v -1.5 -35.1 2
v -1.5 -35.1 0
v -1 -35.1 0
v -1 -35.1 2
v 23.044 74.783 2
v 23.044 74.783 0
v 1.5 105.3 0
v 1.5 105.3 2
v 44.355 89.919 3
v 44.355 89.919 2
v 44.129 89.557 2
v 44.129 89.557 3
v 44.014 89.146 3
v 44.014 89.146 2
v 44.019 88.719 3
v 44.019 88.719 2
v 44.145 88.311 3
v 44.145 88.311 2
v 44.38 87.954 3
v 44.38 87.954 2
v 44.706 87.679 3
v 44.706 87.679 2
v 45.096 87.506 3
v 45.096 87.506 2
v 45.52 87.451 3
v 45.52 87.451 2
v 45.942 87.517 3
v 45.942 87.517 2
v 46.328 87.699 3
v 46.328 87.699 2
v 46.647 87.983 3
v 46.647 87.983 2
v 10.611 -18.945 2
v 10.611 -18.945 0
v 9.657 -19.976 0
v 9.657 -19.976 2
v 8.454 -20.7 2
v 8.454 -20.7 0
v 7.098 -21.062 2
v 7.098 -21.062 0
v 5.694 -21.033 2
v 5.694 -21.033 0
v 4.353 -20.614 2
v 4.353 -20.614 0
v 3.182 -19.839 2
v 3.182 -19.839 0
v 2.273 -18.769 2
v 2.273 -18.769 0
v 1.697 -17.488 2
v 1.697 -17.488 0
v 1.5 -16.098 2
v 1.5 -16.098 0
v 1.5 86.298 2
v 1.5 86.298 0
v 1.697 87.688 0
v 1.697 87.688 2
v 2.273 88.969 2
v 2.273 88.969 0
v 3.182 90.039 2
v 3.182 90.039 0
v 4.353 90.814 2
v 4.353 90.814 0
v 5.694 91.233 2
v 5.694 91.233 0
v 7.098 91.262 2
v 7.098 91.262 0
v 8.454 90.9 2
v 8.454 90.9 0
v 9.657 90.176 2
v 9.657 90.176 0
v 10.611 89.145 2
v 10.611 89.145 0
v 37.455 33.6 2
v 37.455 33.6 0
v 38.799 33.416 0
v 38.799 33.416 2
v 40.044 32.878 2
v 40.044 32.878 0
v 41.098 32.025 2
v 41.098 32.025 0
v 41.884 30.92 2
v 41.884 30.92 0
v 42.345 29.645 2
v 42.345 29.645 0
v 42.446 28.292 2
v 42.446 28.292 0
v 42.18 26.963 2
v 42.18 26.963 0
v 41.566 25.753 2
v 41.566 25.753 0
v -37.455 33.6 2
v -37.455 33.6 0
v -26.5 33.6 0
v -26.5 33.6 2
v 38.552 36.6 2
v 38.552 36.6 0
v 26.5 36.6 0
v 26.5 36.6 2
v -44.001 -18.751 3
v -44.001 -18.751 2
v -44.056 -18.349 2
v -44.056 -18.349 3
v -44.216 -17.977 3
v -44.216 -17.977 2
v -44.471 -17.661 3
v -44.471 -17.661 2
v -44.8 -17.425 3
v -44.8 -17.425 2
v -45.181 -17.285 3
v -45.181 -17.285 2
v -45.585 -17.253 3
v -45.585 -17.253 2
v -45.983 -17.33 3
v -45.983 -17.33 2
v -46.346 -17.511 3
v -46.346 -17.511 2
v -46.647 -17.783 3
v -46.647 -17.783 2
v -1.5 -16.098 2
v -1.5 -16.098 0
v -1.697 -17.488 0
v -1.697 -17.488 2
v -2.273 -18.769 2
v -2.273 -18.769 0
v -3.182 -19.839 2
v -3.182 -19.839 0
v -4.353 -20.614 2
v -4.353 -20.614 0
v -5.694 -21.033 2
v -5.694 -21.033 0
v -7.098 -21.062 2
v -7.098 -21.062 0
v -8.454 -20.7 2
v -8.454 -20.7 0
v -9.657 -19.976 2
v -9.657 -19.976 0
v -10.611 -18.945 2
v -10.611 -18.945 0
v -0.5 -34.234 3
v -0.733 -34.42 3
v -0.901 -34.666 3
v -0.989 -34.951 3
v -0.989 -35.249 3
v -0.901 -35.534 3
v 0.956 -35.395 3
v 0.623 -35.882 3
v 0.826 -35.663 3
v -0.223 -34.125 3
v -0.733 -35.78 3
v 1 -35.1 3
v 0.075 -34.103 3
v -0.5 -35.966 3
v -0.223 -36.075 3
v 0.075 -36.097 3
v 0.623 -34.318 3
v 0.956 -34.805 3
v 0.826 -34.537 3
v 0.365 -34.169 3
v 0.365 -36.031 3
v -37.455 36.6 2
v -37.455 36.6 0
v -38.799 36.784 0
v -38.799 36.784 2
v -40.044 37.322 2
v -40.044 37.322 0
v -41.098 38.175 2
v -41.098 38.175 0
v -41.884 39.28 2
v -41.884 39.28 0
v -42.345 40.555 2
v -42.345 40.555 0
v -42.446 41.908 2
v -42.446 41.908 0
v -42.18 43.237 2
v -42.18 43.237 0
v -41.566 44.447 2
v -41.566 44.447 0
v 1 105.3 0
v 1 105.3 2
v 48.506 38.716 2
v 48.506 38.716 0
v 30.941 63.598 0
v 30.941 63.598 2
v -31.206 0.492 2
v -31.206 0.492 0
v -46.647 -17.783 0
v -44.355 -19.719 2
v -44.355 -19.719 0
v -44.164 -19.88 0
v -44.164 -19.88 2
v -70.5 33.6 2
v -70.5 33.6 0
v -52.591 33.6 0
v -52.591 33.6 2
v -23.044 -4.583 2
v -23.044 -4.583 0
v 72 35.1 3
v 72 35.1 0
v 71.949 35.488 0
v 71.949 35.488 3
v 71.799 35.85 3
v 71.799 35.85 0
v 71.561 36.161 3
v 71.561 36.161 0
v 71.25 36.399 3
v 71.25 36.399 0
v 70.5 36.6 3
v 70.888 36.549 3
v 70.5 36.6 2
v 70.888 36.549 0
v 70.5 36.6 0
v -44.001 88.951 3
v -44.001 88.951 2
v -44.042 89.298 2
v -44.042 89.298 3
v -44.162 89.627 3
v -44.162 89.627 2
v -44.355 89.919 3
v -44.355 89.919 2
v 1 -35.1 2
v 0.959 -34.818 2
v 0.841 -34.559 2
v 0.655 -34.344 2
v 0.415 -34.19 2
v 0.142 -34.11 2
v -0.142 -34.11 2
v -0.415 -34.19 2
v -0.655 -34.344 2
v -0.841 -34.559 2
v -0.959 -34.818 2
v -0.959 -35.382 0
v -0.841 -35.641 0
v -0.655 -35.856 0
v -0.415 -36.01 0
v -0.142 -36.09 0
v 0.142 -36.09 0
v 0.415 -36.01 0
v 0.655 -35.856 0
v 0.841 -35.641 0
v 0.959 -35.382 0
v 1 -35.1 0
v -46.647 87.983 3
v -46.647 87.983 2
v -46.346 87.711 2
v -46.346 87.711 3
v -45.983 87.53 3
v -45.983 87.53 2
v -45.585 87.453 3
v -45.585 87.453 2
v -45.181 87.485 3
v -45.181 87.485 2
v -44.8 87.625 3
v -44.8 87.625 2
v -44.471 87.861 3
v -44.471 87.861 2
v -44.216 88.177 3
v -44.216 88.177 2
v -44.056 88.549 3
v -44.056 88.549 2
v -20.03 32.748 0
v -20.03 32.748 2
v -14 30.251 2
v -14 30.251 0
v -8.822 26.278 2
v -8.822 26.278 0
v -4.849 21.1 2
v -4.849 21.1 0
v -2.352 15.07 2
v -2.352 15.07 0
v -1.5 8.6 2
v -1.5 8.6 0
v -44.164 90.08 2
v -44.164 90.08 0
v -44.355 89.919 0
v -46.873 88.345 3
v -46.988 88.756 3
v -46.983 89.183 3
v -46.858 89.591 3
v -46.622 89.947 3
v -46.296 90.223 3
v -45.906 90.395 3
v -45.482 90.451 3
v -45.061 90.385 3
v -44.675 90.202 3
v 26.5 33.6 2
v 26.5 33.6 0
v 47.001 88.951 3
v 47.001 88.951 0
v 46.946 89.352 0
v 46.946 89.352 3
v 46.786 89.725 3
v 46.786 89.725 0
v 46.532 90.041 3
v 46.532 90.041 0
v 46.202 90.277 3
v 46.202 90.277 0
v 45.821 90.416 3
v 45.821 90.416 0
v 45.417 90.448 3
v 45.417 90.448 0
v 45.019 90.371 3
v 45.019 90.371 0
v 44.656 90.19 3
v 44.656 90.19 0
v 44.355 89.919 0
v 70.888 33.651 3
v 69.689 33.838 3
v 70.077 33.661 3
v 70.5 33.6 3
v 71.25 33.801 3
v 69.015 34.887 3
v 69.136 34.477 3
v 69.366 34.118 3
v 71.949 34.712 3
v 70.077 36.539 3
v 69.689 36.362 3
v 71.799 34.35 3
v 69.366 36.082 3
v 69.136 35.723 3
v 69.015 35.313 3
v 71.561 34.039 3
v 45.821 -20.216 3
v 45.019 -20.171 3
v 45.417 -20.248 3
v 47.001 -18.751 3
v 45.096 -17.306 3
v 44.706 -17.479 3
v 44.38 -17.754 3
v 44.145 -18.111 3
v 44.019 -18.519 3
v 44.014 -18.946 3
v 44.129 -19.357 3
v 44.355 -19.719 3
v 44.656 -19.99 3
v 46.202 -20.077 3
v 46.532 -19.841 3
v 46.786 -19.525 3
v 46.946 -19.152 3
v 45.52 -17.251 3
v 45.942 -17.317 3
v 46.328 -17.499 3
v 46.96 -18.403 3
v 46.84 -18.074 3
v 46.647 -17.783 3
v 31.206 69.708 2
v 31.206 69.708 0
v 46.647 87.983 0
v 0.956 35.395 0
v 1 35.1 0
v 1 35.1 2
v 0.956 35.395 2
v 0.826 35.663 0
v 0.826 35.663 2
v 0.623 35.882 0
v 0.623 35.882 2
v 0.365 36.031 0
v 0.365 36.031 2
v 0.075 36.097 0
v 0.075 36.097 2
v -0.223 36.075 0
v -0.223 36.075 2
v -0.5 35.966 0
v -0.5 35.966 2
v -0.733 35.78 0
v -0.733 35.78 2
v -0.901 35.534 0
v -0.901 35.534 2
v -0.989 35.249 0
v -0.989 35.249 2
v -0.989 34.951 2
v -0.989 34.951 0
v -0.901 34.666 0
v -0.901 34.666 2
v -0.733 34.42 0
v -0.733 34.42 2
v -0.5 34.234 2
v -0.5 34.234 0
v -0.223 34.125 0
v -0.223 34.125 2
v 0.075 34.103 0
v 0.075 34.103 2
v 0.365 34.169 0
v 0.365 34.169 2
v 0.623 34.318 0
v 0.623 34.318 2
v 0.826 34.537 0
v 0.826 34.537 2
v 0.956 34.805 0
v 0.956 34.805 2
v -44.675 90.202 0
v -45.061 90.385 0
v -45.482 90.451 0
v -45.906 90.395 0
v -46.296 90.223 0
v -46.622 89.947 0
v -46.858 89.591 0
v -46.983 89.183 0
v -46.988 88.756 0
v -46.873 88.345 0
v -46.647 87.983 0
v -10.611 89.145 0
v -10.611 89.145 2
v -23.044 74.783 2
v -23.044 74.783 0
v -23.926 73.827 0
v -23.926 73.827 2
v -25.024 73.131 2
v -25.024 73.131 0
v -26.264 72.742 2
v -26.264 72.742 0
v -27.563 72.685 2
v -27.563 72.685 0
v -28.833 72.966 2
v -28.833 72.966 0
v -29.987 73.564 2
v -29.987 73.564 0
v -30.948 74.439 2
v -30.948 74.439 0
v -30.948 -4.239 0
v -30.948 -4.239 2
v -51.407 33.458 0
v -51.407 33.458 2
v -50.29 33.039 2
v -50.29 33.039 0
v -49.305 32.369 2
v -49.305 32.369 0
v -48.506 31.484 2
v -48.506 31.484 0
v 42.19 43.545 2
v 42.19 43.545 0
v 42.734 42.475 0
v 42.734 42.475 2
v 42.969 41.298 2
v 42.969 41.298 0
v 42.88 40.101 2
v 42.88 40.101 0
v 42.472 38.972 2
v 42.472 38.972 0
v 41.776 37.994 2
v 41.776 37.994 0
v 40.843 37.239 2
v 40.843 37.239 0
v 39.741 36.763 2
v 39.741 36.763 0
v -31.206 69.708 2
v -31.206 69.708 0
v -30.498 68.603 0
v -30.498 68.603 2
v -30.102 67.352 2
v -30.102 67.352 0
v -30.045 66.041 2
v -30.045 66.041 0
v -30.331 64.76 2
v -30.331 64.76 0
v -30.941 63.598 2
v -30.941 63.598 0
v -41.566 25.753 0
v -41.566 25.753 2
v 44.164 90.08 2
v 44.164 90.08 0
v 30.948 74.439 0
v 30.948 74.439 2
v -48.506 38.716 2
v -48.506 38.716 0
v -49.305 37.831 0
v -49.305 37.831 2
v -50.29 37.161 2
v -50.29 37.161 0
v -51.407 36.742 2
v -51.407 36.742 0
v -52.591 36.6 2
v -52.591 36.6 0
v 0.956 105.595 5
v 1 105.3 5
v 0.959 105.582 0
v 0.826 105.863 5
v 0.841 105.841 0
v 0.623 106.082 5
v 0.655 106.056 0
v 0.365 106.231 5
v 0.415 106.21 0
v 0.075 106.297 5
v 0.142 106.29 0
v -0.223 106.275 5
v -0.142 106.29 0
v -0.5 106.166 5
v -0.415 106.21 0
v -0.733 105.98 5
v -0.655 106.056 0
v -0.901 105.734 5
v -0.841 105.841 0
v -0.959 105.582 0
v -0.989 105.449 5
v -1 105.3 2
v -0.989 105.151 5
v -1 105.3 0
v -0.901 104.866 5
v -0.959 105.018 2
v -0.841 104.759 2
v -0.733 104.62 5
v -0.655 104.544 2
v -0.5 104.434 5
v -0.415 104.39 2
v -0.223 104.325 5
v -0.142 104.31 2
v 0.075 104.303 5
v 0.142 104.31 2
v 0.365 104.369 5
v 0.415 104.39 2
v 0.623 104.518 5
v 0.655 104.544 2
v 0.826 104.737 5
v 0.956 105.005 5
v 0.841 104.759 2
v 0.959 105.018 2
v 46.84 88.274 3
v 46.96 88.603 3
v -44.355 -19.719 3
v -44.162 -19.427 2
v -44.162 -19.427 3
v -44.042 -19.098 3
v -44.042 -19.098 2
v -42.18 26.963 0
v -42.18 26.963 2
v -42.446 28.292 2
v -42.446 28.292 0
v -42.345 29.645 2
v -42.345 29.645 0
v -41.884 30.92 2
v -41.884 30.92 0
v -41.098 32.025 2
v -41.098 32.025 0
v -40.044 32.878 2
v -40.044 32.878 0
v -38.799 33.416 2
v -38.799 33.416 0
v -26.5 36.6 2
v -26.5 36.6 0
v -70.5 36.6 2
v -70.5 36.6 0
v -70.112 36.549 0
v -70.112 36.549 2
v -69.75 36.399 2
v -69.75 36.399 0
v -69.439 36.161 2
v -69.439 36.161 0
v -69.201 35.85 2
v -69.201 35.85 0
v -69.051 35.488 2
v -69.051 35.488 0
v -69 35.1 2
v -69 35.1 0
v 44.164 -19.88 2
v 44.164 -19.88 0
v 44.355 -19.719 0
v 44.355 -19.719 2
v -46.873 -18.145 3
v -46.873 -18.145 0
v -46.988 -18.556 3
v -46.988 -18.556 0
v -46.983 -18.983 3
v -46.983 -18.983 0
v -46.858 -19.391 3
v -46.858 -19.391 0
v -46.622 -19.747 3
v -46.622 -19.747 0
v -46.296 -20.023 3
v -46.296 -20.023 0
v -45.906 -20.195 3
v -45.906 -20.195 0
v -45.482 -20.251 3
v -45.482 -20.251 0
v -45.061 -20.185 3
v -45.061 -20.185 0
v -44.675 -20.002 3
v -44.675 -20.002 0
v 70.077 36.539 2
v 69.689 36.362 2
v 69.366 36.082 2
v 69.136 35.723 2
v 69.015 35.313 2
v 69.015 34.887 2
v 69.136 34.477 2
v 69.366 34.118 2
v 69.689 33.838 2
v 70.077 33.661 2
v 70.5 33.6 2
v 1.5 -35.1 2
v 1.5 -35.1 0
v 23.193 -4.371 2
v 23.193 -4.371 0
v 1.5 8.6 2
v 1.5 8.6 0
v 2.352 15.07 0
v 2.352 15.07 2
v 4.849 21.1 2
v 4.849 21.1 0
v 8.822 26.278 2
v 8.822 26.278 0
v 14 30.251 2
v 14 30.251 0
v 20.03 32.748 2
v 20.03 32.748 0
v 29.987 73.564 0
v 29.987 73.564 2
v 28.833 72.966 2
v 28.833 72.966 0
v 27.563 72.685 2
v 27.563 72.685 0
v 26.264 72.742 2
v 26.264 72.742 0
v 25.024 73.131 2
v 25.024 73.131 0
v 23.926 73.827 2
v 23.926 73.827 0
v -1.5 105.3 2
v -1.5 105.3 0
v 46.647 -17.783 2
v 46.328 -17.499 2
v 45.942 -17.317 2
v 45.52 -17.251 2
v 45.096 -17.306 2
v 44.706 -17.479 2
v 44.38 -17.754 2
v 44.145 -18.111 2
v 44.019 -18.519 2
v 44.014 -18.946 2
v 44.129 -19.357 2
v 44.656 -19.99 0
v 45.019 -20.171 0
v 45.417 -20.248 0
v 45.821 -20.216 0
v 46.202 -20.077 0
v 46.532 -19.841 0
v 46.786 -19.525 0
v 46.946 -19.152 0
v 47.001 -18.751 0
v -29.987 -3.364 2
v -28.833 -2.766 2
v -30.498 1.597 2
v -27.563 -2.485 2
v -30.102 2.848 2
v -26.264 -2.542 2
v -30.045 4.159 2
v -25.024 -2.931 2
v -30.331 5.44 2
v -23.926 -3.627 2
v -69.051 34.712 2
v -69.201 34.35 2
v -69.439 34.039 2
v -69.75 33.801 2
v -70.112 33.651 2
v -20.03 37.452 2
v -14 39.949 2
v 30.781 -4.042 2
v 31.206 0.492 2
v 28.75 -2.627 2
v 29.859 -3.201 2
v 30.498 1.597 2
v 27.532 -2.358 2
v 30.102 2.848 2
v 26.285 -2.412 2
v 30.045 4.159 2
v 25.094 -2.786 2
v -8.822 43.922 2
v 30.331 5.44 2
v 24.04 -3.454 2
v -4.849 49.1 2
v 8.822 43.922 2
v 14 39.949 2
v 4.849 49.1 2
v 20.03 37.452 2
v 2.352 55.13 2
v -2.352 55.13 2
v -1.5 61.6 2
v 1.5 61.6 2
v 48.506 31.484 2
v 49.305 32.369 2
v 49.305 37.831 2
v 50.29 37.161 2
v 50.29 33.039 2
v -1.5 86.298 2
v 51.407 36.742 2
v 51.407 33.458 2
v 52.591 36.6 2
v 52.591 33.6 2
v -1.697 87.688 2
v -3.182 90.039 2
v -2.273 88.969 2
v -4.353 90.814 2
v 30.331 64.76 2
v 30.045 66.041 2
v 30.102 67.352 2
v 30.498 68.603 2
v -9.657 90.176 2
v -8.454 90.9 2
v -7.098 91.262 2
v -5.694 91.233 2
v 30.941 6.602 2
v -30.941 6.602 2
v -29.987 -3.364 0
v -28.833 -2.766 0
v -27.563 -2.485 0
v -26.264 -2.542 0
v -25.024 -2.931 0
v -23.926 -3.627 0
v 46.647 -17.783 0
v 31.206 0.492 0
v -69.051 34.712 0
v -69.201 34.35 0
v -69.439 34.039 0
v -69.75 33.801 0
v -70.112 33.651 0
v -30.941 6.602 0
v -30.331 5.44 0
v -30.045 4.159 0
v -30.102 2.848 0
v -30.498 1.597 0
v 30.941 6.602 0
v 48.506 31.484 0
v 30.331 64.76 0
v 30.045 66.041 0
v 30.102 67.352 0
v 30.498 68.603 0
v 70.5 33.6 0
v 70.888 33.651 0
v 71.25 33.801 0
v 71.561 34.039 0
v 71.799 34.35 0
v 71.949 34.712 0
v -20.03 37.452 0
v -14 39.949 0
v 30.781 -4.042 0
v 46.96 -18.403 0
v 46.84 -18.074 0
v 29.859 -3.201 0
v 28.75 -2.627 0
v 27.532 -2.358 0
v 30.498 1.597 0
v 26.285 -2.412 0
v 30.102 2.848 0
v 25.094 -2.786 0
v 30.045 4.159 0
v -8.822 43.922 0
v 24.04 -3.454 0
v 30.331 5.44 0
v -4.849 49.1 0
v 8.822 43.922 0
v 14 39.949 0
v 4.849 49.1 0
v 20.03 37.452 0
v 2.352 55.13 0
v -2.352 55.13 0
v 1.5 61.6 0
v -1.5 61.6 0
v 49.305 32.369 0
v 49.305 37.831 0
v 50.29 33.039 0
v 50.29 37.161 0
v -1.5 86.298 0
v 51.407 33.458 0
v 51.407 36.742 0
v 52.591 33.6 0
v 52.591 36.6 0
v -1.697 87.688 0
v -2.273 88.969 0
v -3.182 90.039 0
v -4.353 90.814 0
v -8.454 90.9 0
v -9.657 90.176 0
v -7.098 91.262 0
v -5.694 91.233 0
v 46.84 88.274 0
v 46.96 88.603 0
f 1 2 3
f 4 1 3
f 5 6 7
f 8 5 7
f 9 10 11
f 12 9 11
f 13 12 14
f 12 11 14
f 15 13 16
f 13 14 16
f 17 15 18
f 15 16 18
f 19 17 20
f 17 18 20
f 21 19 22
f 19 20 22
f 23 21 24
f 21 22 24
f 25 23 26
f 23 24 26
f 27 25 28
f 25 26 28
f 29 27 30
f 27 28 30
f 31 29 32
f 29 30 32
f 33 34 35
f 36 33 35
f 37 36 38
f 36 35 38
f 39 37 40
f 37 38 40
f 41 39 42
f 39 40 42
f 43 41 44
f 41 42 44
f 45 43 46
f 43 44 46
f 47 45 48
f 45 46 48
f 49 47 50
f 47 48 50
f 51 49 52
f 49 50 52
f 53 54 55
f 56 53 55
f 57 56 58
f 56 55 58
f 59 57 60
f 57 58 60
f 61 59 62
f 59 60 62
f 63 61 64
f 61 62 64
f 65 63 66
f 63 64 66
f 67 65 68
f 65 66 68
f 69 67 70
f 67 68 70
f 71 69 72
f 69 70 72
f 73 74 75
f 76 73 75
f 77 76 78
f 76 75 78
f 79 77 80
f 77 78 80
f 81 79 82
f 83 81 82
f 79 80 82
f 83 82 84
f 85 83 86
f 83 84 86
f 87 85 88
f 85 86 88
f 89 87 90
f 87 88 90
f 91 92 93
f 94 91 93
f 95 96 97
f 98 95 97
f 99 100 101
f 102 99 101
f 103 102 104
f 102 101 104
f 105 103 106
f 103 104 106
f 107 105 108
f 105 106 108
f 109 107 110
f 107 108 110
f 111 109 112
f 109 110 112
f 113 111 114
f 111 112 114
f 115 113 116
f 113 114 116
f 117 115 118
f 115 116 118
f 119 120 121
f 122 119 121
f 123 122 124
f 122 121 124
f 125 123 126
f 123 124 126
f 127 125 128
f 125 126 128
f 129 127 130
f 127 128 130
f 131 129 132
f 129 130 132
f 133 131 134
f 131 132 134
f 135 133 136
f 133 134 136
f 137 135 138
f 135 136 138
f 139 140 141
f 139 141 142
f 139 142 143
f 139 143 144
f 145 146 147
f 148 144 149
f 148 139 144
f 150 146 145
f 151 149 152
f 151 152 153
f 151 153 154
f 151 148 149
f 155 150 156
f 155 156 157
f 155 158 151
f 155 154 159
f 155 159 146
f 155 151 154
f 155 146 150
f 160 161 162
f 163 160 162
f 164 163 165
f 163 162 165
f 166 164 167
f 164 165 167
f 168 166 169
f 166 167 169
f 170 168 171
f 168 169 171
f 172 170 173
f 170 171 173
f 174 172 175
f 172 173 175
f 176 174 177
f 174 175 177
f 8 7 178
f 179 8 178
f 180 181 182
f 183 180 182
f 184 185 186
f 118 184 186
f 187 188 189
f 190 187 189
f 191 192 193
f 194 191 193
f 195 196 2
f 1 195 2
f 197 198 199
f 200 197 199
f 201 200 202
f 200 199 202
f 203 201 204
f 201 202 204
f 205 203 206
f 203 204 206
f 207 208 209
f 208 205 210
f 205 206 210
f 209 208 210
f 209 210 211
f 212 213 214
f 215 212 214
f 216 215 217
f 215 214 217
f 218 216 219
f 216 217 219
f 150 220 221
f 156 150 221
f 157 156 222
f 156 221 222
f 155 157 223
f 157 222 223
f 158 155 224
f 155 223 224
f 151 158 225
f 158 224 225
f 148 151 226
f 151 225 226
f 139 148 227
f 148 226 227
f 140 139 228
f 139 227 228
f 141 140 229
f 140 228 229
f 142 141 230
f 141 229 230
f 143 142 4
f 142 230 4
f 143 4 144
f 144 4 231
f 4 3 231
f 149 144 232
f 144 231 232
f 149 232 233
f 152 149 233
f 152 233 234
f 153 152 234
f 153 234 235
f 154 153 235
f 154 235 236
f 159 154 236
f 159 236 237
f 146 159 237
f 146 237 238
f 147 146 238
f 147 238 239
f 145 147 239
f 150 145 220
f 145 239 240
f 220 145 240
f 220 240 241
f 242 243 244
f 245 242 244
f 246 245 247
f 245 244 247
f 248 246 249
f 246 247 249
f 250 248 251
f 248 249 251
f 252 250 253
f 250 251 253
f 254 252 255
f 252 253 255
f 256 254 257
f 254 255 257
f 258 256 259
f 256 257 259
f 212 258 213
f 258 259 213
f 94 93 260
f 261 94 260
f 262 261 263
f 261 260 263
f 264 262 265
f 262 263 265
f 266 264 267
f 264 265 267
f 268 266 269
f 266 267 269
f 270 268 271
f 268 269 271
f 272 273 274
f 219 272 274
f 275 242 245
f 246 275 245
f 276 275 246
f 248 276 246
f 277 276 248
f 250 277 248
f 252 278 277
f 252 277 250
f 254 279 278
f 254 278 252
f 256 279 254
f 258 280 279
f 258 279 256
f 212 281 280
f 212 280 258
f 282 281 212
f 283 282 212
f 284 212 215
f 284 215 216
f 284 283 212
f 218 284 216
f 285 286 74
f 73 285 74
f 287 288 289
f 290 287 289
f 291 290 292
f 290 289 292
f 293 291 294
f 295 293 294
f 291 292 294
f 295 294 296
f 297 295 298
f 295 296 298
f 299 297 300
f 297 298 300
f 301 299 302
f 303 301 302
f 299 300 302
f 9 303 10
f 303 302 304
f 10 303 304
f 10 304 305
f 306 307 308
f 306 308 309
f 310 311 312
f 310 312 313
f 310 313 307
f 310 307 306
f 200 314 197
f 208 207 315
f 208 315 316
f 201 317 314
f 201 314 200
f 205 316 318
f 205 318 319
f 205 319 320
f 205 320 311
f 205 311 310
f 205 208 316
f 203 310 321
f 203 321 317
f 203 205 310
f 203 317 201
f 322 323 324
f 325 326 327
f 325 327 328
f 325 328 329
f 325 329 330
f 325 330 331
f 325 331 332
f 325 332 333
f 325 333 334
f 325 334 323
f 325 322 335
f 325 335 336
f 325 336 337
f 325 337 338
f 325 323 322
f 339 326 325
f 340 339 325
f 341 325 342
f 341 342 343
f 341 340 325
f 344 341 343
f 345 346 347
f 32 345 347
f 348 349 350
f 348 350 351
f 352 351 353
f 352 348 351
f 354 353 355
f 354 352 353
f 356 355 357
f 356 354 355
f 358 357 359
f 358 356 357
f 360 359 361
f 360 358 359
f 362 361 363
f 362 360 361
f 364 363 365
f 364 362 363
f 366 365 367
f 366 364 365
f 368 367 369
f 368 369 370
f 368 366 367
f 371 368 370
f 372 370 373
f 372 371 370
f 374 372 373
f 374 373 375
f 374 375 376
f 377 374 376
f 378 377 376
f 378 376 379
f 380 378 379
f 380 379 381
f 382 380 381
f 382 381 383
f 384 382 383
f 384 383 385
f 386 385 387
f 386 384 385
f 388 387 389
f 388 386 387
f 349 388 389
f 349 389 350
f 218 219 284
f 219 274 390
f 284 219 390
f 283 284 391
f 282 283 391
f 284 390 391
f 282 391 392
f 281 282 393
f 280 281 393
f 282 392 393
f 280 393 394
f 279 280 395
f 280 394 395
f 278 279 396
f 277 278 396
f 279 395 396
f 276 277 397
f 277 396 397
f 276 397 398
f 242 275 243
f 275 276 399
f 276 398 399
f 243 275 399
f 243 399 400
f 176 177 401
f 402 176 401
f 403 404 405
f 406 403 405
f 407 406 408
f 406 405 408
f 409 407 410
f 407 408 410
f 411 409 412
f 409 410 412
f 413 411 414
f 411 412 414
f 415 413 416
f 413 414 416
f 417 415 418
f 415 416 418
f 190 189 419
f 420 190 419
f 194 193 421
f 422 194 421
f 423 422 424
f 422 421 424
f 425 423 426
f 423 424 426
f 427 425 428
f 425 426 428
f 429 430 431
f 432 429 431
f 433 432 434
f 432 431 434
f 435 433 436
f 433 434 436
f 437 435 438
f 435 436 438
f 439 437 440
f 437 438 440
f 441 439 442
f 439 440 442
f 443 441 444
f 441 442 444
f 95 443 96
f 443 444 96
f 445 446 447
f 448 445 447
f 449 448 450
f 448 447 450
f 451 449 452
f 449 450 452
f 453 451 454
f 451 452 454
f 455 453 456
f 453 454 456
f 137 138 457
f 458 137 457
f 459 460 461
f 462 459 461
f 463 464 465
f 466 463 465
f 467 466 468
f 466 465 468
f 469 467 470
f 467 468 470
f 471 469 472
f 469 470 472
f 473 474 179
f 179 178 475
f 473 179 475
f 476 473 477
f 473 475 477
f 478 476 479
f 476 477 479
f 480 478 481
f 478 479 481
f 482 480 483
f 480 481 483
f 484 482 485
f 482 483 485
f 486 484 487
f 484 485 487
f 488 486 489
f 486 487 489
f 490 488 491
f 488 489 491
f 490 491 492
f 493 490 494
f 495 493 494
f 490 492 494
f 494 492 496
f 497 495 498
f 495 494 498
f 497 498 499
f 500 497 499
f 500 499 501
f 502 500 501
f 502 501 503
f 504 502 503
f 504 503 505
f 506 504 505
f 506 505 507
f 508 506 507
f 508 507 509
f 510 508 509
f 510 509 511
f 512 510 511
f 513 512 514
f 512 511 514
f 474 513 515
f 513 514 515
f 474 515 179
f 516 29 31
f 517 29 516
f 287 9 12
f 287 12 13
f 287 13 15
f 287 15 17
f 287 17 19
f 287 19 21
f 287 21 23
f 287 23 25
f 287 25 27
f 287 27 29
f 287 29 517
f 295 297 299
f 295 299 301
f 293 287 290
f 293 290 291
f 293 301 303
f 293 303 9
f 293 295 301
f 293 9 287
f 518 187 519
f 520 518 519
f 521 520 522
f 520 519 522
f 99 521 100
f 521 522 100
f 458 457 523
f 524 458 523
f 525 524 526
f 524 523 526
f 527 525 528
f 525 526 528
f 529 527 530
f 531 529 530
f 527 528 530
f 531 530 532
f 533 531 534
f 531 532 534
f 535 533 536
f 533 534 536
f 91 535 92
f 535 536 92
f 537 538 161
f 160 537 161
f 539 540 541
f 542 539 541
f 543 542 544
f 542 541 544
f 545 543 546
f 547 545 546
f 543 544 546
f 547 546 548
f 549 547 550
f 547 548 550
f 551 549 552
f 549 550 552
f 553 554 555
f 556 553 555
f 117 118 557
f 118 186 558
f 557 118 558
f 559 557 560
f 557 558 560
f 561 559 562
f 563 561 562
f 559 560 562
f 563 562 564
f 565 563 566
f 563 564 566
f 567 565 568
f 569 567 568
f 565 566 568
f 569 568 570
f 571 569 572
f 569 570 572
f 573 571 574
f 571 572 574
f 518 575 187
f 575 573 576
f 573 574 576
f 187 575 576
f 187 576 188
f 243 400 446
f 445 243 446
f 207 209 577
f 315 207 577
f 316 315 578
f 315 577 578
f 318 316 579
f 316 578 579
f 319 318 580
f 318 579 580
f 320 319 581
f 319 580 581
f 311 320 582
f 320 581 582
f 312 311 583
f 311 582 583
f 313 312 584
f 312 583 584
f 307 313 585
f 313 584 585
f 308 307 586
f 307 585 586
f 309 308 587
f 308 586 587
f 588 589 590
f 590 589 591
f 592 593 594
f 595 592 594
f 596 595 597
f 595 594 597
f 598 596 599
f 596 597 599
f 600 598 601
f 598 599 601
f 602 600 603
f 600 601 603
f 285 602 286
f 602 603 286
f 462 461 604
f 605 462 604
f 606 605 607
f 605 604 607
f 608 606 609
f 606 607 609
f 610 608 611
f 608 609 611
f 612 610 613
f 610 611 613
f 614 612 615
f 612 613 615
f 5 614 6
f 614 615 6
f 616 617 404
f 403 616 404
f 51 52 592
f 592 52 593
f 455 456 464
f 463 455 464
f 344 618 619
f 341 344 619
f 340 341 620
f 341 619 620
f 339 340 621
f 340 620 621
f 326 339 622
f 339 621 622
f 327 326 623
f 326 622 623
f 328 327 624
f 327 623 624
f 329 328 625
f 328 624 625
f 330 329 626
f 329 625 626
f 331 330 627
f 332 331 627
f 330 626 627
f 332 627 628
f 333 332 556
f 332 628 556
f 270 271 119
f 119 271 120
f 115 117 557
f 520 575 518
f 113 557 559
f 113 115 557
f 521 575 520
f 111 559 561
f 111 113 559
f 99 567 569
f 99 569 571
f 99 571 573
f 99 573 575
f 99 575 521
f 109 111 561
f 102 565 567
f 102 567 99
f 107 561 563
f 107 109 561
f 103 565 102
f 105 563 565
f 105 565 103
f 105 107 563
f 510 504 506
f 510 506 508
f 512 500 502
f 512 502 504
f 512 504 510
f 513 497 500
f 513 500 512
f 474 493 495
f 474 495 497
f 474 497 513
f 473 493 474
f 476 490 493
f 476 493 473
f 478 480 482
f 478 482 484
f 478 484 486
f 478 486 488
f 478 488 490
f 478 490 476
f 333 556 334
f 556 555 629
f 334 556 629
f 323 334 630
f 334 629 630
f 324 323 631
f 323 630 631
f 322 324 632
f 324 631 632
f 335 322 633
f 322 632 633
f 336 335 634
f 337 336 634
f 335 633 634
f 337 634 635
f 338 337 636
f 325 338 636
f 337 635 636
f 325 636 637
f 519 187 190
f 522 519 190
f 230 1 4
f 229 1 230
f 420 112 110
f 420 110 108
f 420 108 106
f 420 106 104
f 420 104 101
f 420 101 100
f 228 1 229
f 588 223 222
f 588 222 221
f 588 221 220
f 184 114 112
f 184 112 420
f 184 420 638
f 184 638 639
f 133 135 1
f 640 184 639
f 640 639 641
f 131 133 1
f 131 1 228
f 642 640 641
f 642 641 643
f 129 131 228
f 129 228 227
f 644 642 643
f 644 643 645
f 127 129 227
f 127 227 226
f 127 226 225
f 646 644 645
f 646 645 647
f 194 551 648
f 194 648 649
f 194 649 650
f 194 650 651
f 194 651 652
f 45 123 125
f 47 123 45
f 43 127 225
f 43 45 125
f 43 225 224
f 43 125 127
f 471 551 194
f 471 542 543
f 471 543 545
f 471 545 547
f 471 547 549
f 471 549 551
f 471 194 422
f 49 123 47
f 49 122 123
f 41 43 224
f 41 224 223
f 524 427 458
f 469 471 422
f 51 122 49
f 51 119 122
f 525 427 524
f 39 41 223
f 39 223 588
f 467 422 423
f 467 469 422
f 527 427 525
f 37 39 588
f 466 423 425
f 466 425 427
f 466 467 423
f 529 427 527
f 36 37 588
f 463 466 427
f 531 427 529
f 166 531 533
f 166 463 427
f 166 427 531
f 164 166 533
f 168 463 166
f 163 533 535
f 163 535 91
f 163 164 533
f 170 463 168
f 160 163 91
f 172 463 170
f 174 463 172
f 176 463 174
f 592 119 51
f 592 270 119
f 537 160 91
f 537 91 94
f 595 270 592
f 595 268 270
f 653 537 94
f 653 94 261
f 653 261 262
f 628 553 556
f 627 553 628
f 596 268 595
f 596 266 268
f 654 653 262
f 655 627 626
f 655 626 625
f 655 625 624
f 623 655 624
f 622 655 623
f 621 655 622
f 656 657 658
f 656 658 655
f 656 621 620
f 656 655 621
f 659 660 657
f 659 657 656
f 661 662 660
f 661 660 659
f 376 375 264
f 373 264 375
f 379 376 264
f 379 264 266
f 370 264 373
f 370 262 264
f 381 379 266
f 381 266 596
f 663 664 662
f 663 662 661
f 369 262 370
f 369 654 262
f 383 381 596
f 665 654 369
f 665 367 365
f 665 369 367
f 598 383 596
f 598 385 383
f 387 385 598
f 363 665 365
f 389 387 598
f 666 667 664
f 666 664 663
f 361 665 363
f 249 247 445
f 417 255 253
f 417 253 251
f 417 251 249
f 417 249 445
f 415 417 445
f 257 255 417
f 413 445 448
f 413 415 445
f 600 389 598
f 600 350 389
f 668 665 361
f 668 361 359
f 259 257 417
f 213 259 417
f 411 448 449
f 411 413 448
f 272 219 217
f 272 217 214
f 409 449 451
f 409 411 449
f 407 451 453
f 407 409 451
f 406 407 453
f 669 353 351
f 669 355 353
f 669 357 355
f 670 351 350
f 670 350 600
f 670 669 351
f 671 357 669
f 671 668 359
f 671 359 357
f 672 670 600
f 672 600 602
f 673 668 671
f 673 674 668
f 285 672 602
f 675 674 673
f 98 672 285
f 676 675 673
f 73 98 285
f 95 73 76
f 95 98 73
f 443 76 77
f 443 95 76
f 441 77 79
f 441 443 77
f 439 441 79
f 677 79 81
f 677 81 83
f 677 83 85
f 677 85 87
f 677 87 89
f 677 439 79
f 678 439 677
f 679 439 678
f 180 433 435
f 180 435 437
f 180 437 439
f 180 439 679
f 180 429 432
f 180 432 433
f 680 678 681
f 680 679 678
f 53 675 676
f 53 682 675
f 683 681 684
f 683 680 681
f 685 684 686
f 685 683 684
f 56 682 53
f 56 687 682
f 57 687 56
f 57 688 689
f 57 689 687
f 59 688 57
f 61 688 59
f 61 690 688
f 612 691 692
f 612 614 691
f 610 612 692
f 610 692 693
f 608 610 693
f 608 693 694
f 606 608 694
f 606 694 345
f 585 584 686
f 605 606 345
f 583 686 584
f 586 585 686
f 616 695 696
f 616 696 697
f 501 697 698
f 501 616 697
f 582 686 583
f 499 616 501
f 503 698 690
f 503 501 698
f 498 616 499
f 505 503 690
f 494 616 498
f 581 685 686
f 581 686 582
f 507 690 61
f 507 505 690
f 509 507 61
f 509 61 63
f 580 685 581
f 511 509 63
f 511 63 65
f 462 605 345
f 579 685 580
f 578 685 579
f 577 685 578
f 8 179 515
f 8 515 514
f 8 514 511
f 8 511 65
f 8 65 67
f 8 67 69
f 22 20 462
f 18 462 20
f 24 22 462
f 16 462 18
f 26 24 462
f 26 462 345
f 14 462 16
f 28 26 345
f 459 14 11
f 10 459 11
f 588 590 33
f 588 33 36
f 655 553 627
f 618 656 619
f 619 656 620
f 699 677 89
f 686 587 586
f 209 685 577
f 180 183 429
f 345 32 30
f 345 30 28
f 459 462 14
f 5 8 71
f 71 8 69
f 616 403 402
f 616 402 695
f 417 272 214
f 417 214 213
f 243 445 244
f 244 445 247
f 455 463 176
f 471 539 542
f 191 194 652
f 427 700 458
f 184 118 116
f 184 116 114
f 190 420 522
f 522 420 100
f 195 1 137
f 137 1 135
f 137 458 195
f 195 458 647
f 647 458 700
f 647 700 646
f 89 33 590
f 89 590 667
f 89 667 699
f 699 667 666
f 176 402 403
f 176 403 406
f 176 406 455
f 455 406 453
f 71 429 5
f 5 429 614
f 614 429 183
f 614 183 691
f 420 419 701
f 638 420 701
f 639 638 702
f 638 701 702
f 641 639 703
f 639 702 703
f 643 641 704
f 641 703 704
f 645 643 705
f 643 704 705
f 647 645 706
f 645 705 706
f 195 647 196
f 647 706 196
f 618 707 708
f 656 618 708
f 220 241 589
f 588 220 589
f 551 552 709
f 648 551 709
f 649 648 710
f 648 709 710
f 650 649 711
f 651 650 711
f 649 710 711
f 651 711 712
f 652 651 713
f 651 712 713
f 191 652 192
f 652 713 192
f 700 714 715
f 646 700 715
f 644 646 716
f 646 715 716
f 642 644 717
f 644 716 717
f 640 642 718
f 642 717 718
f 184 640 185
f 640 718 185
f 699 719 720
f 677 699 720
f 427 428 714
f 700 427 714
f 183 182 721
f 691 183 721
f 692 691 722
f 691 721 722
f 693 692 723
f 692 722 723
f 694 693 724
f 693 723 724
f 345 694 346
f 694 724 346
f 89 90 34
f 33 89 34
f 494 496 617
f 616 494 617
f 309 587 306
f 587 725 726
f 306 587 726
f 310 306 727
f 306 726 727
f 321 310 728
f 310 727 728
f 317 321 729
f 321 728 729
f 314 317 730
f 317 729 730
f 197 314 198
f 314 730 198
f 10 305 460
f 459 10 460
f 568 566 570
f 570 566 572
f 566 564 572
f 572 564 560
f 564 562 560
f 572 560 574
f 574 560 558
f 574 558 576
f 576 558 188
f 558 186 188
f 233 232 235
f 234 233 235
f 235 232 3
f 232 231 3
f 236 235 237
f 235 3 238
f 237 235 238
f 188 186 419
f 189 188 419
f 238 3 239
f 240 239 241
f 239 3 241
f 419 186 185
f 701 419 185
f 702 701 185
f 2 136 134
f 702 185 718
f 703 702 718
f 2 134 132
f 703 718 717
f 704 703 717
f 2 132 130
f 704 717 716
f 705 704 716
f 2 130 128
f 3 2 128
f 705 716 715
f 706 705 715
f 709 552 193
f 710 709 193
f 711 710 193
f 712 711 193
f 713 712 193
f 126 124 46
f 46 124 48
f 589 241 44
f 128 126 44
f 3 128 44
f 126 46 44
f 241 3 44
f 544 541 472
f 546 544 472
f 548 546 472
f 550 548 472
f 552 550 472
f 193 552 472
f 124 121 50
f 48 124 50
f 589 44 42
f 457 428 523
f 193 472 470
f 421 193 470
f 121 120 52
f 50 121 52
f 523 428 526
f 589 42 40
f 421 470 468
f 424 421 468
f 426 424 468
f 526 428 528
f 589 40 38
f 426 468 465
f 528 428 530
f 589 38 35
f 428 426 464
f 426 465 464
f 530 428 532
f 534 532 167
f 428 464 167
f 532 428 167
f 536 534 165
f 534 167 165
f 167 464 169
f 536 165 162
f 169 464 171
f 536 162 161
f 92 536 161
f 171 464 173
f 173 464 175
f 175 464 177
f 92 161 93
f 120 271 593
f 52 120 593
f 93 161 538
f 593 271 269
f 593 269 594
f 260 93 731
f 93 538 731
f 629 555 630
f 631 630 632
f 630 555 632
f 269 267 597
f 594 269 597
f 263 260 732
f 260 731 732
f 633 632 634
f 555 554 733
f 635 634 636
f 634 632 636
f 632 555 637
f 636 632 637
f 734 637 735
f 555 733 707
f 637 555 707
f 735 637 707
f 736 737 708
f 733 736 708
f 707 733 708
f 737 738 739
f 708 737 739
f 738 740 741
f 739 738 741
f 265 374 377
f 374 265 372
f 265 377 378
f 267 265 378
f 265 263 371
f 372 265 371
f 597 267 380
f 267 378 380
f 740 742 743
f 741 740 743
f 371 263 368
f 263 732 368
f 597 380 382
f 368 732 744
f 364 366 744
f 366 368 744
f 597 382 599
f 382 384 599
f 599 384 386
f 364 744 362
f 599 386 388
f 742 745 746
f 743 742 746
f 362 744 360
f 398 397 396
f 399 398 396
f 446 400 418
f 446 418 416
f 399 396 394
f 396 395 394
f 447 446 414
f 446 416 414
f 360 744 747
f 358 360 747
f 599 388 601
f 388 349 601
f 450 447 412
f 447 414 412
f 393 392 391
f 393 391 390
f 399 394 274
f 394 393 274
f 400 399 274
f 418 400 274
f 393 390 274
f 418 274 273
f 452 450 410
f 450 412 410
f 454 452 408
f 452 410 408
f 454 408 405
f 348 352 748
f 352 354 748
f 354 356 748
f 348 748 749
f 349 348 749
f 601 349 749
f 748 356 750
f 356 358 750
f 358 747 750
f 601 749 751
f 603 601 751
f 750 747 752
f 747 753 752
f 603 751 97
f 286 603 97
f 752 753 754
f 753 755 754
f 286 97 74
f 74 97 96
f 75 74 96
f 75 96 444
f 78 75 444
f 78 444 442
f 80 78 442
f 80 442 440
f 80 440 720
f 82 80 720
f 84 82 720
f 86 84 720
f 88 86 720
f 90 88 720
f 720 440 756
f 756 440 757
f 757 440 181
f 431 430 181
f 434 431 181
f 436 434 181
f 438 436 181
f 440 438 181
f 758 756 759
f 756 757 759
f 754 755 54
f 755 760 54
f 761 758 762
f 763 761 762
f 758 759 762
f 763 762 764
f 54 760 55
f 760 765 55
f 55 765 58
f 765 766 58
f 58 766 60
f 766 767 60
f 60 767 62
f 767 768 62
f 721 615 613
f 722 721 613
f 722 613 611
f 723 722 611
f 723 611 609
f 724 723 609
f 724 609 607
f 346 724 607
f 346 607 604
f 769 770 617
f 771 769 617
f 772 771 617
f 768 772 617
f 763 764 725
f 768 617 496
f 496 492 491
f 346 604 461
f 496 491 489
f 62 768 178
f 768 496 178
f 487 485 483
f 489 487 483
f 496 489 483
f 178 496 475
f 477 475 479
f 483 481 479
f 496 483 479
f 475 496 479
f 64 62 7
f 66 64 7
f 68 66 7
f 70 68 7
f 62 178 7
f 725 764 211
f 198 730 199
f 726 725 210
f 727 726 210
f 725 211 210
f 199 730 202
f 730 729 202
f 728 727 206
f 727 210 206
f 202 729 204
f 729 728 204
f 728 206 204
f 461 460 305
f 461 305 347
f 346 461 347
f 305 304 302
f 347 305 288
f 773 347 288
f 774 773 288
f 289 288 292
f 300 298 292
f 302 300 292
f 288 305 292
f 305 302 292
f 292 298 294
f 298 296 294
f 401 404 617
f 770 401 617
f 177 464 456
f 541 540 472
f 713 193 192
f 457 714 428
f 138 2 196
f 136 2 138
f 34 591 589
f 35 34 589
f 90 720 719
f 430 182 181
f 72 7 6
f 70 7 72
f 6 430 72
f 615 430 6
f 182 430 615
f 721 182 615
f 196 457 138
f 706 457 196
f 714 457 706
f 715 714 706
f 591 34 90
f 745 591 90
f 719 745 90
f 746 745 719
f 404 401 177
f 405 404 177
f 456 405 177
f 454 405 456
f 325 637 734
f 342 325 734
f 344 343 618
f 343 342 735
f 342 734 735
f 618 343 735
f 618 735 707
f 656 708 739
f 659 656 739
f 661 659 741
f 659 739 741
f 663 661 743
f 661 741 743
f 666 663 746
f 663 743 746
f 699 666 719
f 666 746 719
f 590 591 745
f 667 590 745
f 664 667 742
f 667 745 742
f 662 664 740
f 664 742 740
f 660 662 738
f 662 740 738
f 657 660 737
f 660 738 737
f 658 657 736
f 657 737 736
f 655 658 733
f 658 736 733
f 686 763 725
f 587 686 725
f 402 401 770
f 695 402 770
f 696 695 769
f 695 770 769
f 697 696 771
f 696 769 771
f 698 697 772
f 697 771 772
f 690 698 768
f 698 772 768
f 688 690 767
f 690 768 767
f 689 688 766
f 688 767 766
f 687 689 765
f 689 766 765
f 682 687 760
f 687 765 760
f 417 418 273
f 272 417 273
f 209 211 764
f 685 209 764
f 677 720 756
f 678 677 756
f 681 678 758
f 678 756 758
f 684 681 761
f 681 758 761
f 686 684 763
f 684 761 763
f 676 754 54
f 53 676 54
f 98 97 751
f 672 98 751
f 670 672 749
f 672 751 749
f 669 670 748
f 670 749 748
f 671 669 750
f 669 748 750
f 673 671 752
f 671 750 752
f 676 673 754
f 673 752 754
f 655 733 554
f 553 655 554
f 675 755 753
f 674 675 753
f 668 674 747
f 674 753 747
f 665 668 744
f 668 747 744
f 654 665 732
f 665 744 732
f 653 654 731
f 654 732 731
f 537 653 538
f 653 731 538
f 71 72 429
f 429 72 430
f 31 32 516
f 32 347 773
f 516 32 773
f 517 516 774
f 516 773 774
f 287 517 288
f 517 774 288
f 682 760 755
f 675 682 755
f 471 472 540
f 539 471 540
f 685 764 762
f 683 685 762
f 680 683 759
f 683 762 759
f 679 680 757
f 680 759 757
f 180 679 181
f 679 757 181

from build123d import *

# Parameters (mm, degrees)
F0_R     = 1
F1_DEPTH = 2
F2_DEPTH = 3
F3_DEPTH = 5


with BuildPart() as f1:
    # F0 (on Top) → F1 (new body)
    with BuildSketch(Plane.XY):
        with BuildLine():
            Line((1, -35.1), (1.5, -35.1))
            Line((1.5, -35.1), (23.193478, -4.3713))
            ThreePointArc((23.193478, -4.3713), (26.906428, -2.344127), (30.781196, -4.041655))
            Line((30.781196, -4.041655), (44.164128, -19.880392))
            Line((44.164128, -19.880392), (44.35536, -19.718811))
            ThreePointArc((44.35536, -19.718811), (44.533011, -17.604942), (46.64688, -17.782593))
            Line((46.64688, -17.782593), (31.206023, 0.491704))
            ThreePointArc((31.206023, 0.491704), (30.029934, 3.501716), (30.940547, 6.602383))
            Line((30.940547, 6.602383), (48.505924, 31.483649))
            ThreePointArc((48.505924, 31.483649), (50.290408, 33.039496), (52.590599, 33.6))
            Line((52.590599, 33.6), (70.5, 33.6))
            ThreePointArc((70.5, 33.6), (69, 35.1), (70.5, 36.6))
            Line((70.5, 36.6), (52.590599, 36.6))
            ThreePointArc((52.590599, 36.6), (50.290408, 37.160504), (48.505924, 38.716351))
            Line((48.505924, 38.716351), (30.940547, 63.597617))
            ThreePointArc((30.940547, 63.597617), (30.029934, 66.698284), (31.206023, 69.708296))
            Line((31.206023, 69.708296), (46.64688, 87.982593))
            ThreePointArc((46.64688, 87.982593), (44.533011, 87.804942), (44.35536, 89.918811))
            Line((44.35536, 89.918811), (44.164128, 90.080392))
            Line((44.164128, 90.080392), (30.948157, 74.439253))
            ThreePointArc((30.948157, 74.439253), (26.91194, 72.670995), (23.044283, 74.782634))
            Line((23.044283, 74.782634), (1.5, 105.3))
            Line((1.5, 105.3), (1, 105.3))
            ThreePointArc((1, 105.3), (0, 104.3), (-1, 105.3))
            Line((-1, 105.3), (-1.5, 105.3))
            Line((-1.5, 105.3), (-23.044283, 74.782634))
            ThreePointArc((-23.044283, 74.782634), (-26.91194, 72.670995), (-30.948157, 74.439253))
            Line((-30.948157, 74.439253), (-44.164128, 90.080392))
            Line((-44.164128, 90.080392), (-44.35536, 89.918811))
            ThreePointArc((-44.35536, 89.918811), (-44.092461, 89.466144), (-44.00112, 88.950702))
            ThreePointArc((-44.00112, 88.950702), (-44.985678, 87.542043), (-46.64688, 87.982593))
            Line((-46.64688, 87.982593), (-31.206023, 69.708296))
            ThreePointArc((-31.206023, 69.708296), (-30.029934, 66.698284), (-30.940547, 63.597617))
            Line((-30.940547, 63.597617), (-48.505924, 38.716351))
            ThreePointArc((-48.505924, 38.716351), (-50.290408, 37.160504), (-52.590599, 36.6))
            Line((-52.590599, 36.6), (-70.5, 36.6))
            ThreePointArc((-70.5, 36.6), (-69.43934, 36.16066), (-69, 35.1))
            ThreePointArc((-69, 35.1), (-69.43934, 34.03934), (-70.5, 33.6))
            Line((-70.5, 33.6), (-52.590599, 33.6))
            ThreePointArc((-52.590599, 33.6), (-50.290408, 33.039496), (-48.505924, 31.483649))
            Line((-48.505924, 31.483649), (-30.940547, 6.602383))
            ThreePointArc((-30.940547, 6.602383), (-30.029934, 3.501716), (-31.206023, 0.491704))
            Line((-31.206023, 0.491704), (-46.64688, -17.782593))
            ThreePointArc((-46.64688, -17.782593), (-44.985678, -17.342043), (-44.00112, -18.750702))
            ThreePointArc((-44.00112, -18.750702), (-44.092461, -19.266144), (-44.35536, -19.718811))
            Line((-44.35536, -19.718811), (-44.164128, -19.880392))
            Line((-44.164128, -19.880392), (-30.948157, -4.239253))
            ThreePointArc((-30.948157, -4.239253), (-26.91194, -2.470995), (-23.044283, -4.582634))
            Line((-23.044283, -4.582634), (-1.5, -35.1))
            Line((-1.5, -35.1), (-1, -35.1))
            ThreePointArc((-1, -35.1), (0, -34.1), (1, -35.1))
        make_face()
        with BuildLine():
            ThreePointArc((-26.5, 33.6), (-8.82233, 26.27767), (-1.5, 8.6))
            Line((-1.5, 8.6), (-1.5, -16.098123))
            ThreePointArc((-1.5, -16.098123), (-5.008784, -20.870573), (-10.61051, -18.944823))
            Line((-10.61051, -18.944823), (-41.565831, 25.753299))
            ThreePointArc((-41.565831, 25.753299), (-41.884401, 30.920183), (-37.455321, 33.6))
            Line((-37.455321, 33.6), (-26.5, 33.6))
        make_face(mode=Mode.SUBTRACT)
        with BuildLine():
            Line((1.5, -16.098123), (1.5, 8.6))
            ThreePointArc((1.5, 8.6), (8.82233, 26.27767), (26.5, 33.6))
            Line((26.5, 33.6), (37.455321, 33.6))
            ThreePointArc((37.455321, 33.6), (41.884401, 30.920183), (41.565831, 25.753299))
            Line((41.565831, 25.753299), (10.61051, -18.944823))
            ThreePointArc((10.61051, -18.944823), (5.008784, -20.870573), (1.5, -16.098123))
        make_face(mode=Mode.SUBTRACT)
        with BuildLine():
            Line((-1.5, 86.298123), (-1.5, 61.6))
            ThreePointArc((-1.5, 61.6), (-8.82233, 43.92233), (-26.5, 36.6))
            Line((-26.5, 36.6), (-37.455321, 36.6))
            ThreePointArc((-37.455321, 36.6), (-41.884401, 39.279817), (-41.565831, 44.446701))
            Line((-41.565831, 44.446701), (-10.61051, 89.144823))
            ThreePointArc((-10.61051, 89.144823), (-5.008784, 91.070573), (-1.5, 86.298123))
        make_face(mode=Mode.SUBTRACT)
        with Locations((0, 35.1)):
            Circle(F0_R, mode=Mode.SUBTRACT)
        with BuildLine():
            ThreePointArc((26.5, 36.6), (8.82233, 43.92233), (1.5, 61.6))
            Line((1.5, 61.6), (1.5, 86.298123))
            ThreePointArc((1.5, 86.298123), (5.008784, 91.070573), (10.61051, 89.144823))
            Line((10.61051, 89.144823), (42.190267, 43.545043))
            ThreePointArc((42.190267, 43.545043), (42.47223, 38.971882), (38.552092, 36.6))
            Line((38.552092, 36.6), (26.5, 36.6))
        make_face(mode=Mode.SUBTRACT)
    extrude(amount=F1_DEPTH)

    # F0 (on Top) → F2 (join)
    with BuildSketch(Plane.XY):
        with BuildLine():
            ThreePointArc((-44.35536, 89.918811), (-46.469229, 90.096461), (-46.64688, 87.982593))
            ThreePointArc((-46.64688, 87.982593), (-44.985678, 87.542043), (-44.00112, 88.950702))
            ThreePointArc((-44.00112, 88.950702), (-44.092461, 89.466144), (-44.35536, 89.918811))
        make_face()
        with BuildLine():
            ThreePointArc((-1, 105.3), (0, 104.3), (1, 105.3))
            ThreePointArc((1, 105.3), (0, 106.3), (-1, 105.3))
        make_face()
        with BuildLine():
            ThreePointArc((44.35536, 89.918811), (44.533011, 87.804942), (46.64688, 87.982593))
            ThreePointArc((46.64688, 87.982593), (46.909779, 88.43526), (47.00112, 88.950702))
            ThreePointArc((47.00112, 88.950702), (46.016562, 90.359361), (44.35536, 89.918811))
        make_face()
        with BuildLine():
            ThreePointArc((70.5, 36.6), (69, 35.1), (70.5, 33.6))
            ThreePointArc((70.5, 33.6), (71.56066, 34.03934), (72, 35.1))
            ThreePointArc((72, 35.1), (71.56066, 36.16066), (70.5, 36.6))
        make_face()
        with BuildLine():
            ThreePointArc((46.64688, -17.782593), (44.533011, -17.604942), (44.35536, -19.718811))
            ThreePointArc((44.35536, -19.718811), (46.016562, -20.159361), (47.00112, -18.750702))
            ThreePointArc((47.00112, -18.750702), (46.909779, -18.23526), (46.64688, -17.782593))
        make_face()
        with BuildLine():
            ThreePointArc((-1, -35.1), (0, -36.1), (1, -35.1))
            ThreePointArc((1, -35.1), (0, -34.1), (-1, -35.1))
        make_face()
        with BuildLine():
            ThreePointArc((-46.64688, -17.782593), (-46.469229, -19.896461), (-44.35536, -19.718811))
            ThreePointArc((-44.35536, -19.718811), (-44.092461, -19.266144), (-44.00112, -18.750702))
            ThreePointArc((-44.00112, -18.750702), (-44.985678, -17.342043), (-46.64688, -17.782593))
        make_face()
    extrude(amount=F2_DEPTH)

    # F0 (on Top) → F3 (join)
    with BuildSketch(Plane.XY):
        with BuildLine():
            ThreePointArc((-1, 105.3), (0, 104.3), (1, 105.3))
            ThreePointArc((1, 105.3), (0, 106.3), (-1, 105.3))
        make_face()
    extrude(amount=F3_DEPTH)


solid = f1.part
